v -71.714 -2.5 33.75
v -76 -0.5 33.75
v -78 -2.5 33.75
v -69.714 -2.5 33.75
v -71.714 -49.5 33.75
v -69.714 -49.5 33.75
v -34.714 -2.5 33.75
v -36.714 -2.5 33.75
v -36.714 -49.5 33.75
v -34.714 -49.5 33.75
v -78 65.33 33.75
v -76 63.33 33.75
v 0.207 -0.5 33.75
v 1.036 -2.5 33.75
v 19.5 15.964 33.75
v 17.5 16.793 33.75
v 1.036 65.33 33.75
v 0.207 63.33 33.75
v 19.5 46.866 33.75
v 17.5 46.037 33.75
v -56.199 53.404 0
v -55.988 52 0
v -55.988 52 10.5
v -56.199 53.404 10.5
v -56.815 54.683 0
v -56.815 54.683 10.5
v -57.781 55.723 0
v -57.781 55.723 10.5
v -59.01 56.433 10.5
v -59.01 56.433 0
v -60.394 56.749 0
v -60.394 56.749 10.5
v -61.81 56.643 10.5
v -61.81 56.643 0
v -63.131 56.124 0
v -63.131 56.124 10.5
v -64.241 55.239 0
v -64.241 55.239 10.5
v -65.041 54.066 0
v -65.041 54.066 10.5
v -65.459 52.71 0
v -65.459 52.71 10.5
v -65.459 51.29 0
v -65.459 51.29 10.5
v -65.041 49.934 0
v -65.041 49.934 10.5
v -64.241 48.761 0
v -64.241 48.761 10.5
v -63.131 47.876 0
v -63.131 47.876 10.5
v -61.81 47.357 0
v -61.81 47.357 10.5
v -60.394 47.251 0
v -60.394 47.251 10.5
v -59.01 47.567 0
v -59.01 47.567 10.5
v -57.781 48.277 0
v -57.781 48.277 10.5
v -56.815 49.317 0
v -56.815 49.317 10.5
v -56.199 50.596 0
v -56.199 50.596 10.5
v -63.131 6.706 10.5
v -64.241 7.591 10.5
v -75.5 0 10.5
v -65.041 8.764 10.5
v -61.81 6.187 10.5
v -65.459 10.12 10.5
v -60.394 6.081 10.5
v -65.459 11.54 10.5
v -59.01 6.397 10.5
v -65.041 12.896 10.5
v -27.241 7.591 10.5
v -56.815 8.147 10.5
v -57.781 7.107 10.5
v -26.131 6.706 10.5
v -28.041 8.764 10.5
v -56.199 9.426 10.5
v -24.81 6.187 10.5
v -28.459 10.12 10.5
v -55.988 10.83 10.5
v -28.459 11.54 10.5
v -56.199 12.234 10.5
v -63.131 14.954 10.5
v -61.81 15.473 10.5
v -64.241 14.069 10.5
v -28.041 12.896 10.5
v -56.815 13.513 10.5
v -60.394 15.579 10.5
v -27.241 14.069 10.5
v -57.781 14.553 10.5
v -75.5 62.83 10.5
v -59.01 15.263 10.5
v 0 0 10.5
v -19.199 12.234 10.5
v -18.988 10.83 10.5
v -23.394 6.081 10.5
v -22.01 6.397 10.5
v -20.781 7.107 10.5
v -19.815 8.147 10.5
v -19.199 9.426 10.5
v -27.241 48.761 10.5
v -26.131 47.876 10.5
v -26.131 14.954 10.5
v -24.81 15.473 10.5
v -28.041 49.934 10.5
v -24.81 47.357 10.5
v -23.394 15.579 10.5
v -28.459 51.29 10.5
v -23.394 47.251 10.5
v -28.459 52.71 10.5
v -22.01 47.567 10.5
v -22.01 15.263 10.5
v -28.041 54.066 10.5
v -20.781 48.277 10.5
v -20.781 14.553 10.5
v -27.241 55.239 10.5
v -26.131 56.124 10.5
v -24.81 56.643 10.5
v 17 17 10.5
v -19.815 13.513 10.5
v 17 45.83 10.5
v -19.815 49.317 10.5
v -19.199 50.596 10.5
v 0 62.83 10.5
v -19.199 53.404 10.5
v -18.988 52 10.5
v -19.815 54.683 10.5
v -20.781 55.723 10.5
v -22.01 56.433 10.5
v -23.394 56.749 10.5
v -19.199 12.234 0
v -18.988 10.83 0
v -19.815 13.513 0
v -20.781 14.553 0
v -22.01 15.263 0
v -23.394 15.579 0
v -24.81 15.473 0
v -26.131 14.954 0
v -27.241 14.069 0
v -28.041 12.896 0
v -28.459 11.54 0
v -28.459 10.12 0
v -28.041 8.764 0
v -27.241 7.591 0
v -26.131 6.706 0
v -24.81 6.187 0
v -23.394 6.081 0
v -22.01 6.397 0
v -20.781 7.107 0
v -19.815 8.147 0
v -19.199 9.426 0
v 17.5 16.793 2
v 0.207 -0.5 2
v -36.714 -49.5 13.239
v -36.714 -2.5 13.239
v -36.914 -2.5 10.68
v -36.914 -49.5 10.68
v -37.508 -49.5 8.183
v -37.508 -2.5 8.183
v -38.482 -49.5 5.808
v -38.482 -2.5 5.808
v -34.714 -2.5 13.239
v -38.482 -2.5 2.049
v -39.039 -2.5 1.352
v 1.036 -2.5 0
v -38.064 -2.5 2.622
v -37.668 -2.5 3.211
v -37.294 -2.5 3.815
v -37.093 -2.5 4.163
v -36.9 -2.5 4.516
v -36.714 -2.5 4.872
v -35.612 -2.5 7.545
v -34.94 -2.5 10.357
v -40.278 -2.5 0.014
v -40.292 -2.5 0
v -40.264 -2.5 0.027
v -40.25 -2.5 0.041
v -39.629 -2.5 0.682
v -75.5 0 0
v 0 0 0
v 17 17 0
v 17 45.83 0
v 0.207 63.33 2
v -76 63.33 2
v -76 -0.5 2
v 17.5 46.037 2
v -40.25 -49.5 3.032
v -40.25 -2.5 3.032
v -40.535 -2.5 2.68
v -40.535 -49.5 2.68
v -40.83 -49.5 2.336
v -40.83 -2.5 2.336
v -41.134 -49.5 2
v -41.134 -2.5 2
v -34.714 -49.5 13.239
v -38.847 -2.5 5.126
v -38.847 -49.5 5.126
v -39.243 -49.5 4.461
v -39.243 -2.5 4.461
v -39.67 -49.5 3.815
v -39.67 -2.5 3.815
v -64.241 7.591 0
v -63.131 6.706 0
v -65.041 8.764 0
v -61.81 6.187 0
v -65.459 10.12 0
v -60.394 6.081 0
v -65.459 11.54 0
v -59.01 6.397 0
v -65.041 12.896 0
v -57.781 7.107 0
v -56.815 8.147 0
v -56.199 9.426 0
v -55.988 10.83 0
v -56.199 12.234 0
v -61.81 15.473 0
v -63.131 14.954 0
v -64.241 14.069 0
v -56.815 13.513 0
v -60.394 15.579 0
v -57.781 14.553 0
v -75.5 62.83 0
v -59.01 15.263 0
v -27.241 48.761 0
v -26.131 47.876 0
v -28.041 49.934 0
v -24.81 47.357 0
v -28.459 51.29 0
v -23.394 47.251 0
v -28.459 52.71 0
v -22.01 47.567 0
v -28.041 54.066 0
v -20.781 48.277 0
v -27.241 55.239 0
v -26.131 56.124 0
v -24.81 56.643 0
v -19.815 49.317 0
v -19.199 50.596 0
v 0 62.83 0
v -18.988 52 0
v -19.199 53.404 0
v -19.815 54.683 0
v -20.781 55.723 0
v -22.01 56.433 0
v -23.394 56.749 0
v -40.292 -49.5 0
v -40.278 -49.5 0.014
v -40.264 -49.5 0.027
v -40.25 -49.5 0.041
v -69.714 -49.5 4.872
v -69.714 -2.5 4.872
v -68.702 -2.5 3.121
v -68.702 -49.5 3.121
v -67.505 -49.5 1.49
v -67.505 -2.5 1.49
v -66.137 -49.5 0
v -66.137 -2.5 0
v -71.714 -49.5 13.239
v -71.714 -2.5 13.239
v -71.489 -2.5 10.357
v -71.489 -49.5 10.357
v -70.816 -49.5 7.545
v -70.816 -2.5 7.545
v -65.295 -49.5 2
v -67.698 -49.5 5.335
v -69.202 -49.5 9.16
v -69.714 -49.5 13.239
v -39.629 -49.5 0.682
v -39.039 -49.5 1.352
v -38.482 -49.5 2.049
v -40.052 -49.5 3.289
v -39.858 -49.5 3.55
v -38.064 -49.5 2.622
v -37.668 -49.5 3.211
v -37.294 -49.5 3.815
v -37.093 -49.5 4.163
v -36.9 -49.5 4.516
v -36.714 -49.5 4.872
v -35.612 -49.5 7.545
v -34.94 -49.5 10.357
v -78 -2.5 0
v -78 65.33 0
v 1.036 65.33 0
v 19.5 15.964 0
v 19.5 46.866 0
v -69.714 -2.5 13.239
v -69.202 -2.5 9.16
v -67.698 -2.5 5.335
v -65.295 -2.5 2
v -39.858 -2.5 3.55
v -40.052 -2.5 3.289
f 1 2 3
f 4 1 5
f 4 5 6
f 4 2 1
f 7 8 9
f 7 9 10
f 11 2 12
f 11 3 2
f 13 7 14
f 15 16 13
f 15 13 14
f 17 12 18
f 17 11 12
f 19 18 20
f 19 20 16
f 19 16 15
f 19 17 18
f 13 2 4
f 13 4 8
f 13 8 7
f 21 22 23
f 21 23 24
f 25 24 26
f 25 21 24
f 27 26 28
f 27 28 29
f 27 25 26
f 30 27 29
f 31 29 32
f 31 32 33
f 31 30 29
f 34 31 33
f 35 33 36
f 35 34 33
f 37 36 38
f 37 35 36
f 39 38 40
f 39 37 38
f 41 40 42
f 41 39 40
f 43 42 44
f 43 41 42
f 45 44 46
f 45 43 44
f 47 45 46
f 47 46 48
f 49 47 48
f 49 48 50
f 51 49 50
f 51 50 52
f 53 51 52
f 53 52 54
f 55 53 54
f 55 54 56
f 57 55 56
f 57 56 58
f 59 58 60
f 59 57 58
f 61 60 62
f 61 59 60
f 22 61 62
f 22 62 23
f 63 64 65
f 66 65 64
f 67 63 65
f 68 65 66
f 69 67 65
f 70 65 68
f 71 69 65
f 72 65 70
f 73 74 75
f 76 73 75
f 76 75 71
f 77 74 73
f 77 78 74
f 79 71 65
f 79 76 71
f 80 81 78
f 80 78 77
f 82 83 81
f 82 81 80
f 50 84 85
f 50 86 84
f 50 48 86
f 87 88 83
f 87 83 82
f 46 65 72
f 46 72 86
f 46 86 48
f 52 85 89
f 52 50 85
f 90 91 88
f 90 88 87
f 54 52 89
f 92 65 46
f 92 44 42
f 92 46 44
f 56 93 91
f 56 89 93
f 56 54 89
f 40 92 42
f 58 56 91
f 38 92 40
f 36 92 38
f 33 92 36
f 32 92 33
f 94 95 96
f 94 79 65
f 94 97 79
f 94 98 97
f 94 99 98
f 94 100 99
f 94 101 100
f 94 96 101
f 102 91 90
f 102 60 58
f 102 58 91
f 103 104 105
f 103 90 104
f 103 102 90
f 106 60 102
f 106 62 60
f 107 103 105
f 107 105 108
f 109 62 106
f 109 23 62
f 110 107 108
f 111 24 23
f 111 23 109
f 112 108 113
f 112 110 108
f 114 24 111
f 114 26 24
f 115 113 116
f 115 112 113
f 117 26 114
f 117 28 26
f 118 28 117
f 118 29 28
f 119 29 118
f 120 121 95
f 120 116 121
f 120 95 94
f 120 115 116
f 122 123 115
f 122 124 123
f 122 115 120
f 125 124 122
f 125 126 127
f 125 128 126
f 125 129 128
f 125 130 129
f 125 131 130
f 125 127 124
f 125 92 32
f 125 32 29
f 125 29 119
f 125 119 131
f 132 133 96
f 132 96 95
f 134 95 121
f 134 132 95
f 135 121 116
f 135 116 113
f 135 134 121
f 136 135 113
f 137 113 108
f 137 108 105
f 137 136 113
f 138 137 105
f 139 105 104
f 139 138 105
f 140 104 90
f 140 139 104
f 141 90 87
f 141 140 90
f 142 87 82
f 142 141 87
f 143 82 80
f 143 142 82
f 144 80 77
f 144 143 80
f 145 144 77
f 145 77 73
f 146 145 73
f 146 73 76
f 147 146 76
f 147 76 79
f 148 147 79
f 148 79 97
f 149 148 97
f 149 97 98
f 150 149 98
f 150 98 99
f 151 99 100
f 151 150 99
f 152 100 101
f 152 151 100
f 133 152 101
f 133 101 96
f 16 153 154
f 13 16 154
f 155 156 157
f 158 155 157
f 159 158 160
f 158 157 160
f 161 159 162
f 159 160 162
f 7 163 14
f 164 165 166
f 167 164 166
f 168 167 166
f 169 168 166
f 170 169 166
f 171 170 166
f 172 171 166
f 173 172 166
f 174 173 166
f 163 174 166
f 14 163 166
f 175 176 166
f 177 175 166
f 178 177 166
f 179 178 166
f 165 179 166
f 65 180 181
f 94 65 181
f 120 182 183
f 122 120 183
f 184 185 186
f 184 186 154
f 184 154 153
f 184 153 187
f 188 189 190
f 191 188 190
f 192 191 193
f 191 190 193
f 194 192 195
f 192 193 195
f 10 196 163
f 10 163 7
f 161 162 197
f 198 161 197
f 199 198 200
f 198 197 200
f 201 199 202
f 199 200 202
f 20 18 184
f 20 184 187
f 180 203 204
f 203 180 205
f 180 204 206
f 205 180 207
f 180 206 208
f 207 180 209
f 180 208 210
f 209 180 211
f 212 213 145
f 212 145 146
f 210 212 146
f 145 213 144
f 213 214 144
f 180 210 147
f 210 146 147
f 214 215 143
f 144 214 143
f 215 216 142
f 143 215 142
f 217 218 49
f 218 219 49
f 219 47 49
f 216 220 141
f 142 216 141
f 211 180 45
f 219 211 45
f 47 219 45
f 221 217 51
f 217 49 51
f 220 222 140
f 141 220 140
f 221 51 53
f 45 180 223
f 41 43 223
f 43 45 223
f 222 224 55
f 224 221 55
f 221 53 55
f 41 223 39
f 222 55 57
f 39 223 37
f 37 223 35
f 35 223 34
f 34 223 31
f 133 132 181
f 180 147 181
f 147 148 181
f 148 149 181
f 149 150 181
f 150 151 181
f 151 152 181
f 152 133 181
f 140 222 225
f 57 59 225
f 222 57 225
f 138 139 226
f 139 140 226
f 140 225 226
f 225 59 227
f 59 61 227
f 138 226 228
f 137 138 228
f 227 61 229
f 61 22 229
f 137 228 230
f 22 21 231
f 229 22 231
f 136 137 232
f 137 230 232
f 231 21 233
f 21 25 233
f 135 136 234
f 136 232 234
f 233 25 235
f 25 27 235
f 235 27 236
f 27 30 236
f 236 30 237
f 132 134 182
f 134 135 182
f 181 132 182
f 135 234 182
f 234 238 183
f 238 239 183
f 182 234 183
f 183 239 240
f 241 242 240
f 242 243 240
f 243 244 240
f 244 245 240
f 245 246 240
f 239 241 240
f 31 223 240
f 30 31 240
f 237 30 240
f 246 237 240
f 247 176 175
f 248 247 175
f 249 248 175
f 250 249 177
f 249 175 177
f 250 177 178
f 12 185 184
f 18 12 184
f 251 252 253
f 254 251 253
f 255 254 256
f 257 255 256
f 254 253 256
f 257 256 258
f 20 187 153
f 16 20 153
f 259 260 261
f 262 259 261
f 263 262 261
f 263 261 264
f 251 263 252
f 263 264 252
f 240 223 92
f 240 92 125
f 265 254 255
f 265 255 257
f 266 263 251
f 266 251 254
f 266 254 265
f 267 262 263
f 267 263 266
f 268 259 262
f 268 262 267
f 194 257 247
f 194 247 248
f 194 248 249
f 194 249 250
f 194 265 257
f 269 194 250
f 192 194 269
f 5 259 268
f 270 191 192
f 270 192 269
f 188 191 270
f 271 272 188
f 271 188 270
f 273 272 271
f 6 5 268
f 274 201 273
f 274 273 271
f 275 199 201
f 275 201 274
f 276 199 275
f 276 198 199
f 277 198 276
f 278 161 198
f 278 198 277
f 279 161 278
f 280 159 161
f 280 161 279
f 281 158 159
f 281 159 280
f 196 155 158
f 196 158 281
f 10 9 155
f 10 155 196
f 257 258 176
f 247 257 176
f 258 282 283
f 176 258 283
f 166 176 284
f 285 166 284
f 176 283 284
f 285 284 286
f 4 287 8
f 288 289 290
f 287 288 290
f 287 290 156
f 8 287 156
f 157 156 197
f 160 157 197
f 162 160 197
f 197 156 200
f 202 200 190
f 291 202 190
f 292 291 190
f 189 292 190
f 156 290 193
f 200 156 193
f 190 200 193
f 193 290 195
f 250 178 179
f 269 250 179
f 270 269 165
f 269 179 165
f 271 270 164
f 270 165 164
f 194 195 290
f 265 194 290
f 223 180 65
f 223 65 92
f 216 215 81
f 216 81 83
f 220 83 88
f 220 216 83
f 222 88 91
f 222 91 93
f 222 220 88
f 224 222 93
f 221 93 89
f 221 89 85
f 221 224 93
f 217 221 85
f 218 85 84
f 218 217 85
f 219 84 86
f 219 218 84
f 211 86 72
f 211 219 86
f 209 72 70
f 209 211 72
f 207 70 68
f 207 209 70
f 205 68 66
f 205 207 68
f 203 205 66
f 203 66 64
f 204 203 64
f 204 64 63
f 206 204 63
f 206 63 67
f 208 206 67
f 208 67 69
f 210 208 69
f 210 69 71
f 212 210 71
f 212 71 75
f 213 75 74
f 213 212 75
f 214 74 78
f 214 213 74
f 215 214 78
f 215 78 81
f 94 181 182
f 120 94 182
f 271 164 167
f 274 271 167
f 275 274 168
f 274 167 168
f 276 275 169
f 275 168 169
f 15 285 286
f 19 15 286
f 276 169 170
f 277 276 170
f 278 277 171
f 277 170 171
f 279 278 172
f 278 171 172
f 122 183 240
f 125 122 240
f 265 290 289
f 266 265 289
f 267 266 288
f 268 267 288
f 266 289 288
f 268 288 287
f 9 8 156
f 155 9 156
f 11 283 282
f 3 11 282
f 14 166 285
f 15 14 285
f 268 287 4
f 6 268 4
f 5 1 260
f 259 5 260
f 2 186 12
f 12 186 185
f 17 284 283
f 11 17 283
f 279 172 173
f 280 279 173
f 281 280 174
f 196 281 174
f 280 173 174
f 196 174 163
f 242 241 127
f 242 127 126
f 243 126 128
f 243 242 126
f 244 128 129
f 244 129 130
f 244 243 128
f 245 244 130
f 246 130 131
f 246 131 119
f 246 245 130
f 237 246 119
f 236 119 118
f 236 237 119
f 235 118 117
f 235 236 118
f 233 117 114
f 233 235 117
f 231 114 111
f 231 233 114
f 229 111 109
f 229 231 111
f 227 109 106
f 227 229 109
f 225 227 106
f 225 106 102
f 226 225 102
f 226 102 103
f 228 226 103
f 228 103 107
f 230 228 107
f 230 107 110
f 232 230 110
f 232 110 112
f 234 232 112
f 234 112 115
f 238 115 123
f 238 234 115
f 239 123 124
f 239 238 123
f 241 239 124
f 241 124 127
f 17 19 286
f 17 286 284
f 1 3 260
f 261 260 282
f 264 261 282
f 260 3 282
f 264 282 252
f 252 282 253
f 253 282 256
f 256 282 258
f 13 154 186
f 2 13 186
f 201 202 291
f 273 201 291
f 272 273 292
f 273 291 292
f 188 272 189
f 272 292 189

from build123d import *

# Parameters (mm, degrees)
F0_W     = 75.5
F0_H     = 62.83
F0_R     = 4.7625
F1_DEPTH = 10.5
F2_W     = 76.2071067812
F2_H     = 63.83
F3_DEPTH = 2
F4_DEPTH = 33.75
F9_DEPTH = 47


# Not quite as in the source:
# - a feature of the source that left no trace in its solid (it failed there, or was rolled back) is left out


with BuildPart() as f1:
    # F0 (on Top) → F1 (new body)
    with BuildSketch(Plane.XY):
        with Locations((-37.75, 31.415)):
            Rectangle(F0_W, F0_H)
        with Locations((-60.75, 10.83)):
            Circle(F0_R, mode=Mode.SUBTRACT)
        with Locations((-23.75, 10.83)):
            Circle(F0_R, mode=Mode.SUBTRACT)
        with Locations((-60.75, 52)):
            Circle(F0_R, mode=Mode.SUBTRACT)
        with Locations((-23.75, 52)):
            Circle(F0_R, mode=Mode.SUBTRACT)
        Polygon((0, 62.83), (0, 0), (17, 17), (17, 45.83), align=None)
    extrude(amount=F1_DEPTH)


with BuildPart() as f3:
    # F2 (on Top) → F3 (new body)
    with BuildSketch(Plane.XY):
        Polygon((1.0355339059, 0.3284271247), (0.2071067812, -0.5), (-76, -0.5), (-76, 63.33), (0.2071067812, 63.33), (1.0355339059, 62.5015728753), (1.0355339059, 65.33), (-78, 65.33), (-78, -2.5), (1.0355339059, -2.5), align=None)
        Polygon((17.5, 16.7928932188), (1.0355339059, 0.3284271247), (1.0355339059, -2.5), (19.5, 15.9644660941), (19.5, 46.8655339059), (1.0355339059, 65.33), (1.0355339059, 62.5015728753), (17.5, 46.0371067812), align=None)
        Polygon((1.0355339059, 62.5015728753), (1.0355339059, 0.3284271247), (17.5, 16.7928932188), (17.5, 46.0371067812), align=None)
        with Locations((-37.8964466094, 31.415)):
            Rectangle(F2_W, F2_H)
        Polygon((0.2071067812, 63.33), (0.2071067812, -0.5), (1.0355339059, 0.3284271247), (1.0355339059, 62.5015728753), align=None)
    extrude(amount=F3_DEPTH)

    # F2 (on Top) → F4 (join)
    with BuildSketch(Plane.XY):
        Polygon((1.0355339059, 0.3284271247), (0.2071067812, -0.5), (-76, -0.5), (-76, 63.33), (0.2071067812, 63.33), (1.0355339059, 62.5015728753), (1.0355339059, 65.33), (-78, 65.33), (-78, -2.5), (1.0355339059, -2.5), align=None)
        Polygon((17.5, 16.7928932188), (1.0355339059, 0.3284271247), (1.0355339059, -2.5), (19.5, 15.9644660941), (19.5, 46.8655339059), (1.0355339059, 65.33), (1.0355339059, 62.5015728753), (17.5, 46.0371067812), align=None)
    extrude(amount=F4_DEPTH)

    # F5: union 

    # F6 (on face) → F9 (join)
    with BuildSketch(Plane.XZ.offset(2.5)):
        with BuildLine():
            Line((-34.7144660941, 25.5687510354), (-34.7144660941, 28.1393741738))
            ThreePointArc((-34.7144660941, 28.1393741738), (-35.7447365731, 27.3232988085), (-36.7144660941, 26.4361342702))
            Line((-36.7144660941, 26.4361342702), (-36.7144660941, 23.4451856875))
            ThreePointArc((-36.7144660941, 23.4451856875), (-35.761487475, 24.5512536772), (-34.7144660941, 25.5687510354))
        make_face()
        with BuildLine():
            ThreePointArc((-36.7144660941, 26.4361342702), (-35.7447365731, 27.3232988085), (-34.7144660941, 28.1393741738))
            Line((-34.7144660941, 28.1393741738), (-34.7144660941, 33.75))
            Line((-34.7144660941, 33.75), (-36.7144660941, 33.75))
            Line((-36.7144660941, 33.75), (-36.7144660941, 26.4361342702))
        make_face()
        with BuildLine():
            Line((-34.7144660941, 13.2386868315), (-34.7144660941, 25.5687510354))
            ThreePointArc((-34.7144660941, 25.5687510354), (-35.761487475, 24.5512536772), (-36.7144660941, 23.4451856875))
            Line((-36.7144660941, 23.4451856875), (-36.7144660941, 21.6052870969))
            ThreePointArc((-36.7144660941, 21.6052870969), (-35.2214118786, 17.5398494651), (-34.7144660941, 13.2386868315))
        make_face()
        with BuildLine():
            ThreePointArc((-36.7144660941, 4.8720865662), (-35.2214118786, 8.937524198), (-34.7144660941, 13.2386868315))
            Line((-34.7144660941, 13.2386868315), (-36.7144660941, 13.2386868315))
            Line((-36.7144660941, 13.2386868315), (-36.7144660941, 4.8720865662))
        make_face()
        with BuildLine():
            Line((-36.7144660941, 13.2386868315), (-34.7144660941, 13.2386868315))
            ThreePointArc((-34.7144660941, 13.2386868315), (-35.2214118786, 17.5398494651), (-36.7144660941, 21.6052870969))
            Line((-36.7144660941, 21.6052870969), (-36.7144660941, 13.2386868315))
        make_face()
        with BuildLine():
            Line((-36.7144660941, 4.8720865662), (-36.7144660941, 13.2386868315))
            ThreePointArc((-36.7144660941, 13.2386868315), (-37.1624904325, 9.4197763374), (-38.482233047, 5.8082555219))
            ThreePointArc((-38.482233047, 5.8082555219), (-37.9233701313, 4.7908717814), (-37.2943615313, 3.8152972763))
            ThreePointArc((-37.2943615313, 3.8152972763), (-36.9958041312, 4.3389675026), (-36.7144660941, 4.8720865662))
        make_face()
        with BuildLine():
            ThreePointArc((-37.2943615313, 3.8152972763), (-37.9233701313, 4.7908717814), (-38.482233047, 5.8082555219))
            ThreePointArc((-38.482233047, 5.8082555219), (-39.0410959628, 4.7908717814), (-39.6701045628, 3.8152972763))
            ThreePointArc((-39.6701045628, 3.8152972763), (-39.1015956593, 2.9149999555), (-38.482233047, 2.0489008887))
            ThreePointArc((-38.482233047, 2.0489008887), (-37.8628704348, 2.9149999555), (-37.2943615313, 3.8152972763))
        make_face()
        with BuildLine():
            ThreePointArc((-40.25, 0.0412393929), (-39.3297816541, 1.0130769081), (-38.482233047, 2.0489008887))
            ThreePointArc((-38.482233047, 2.0489008887), (-39.1015956593, 2.9149999555), (-39.6701045628, 3.8152972763))
            ThreePointArc((-39.6701045628, 3.8152972763), (-39.9542699959, 3.4194608214), (-40.25, 3.0321879756))
            Line((-40.25, 3.0321879756), (-40.25, 0.0412393929))
        make_face()
        with BuildLine():
            ThreePointArc((-40.2921144901, 0), (-40.2710408208, 0.0206029237), (-40.25, 0.0412393929))
            Line((-40.25, 0.0412393929), (-40.25, 3.0321879756))
            ThreePointArc((-40.25, 3.0321879756), (-40.6812814796, 2.5069915592), (-41.1338237973, 2))
            ThreePointArc((-41.1338237973, 2), (-41.6789976888, 1.4411036608), (-42.25, 0.9086226277))
            Line((-42.25, 0.9086226277), (-42.25, 0))
            Line((-42.25, 0), (-40.2921144901, 0))
        make_face()
        with BuildLine():
            Line((-41.1338237973, 2), (-42.25, 2))
            Line((-42.25, 2), (-42.25, 0.9086226277))
            ThreePointArc((-42.25, 0.9086226277), (-41.6789976888, 1.4411036608), (-41.1338237973, 2))
        make_face()
        with BuildLine():
            Line((-42.25, 0.9086226277), (-42.25, 2))
            Line((-42.25, 2), (-65.2951083908, 2))
            ThreePointArc((-65.2951083908, 2), (-64.2243980751, 0.9492036132), (-63.0626725793, 0))
            Line((-63.0626725793, 0), (-60.75, 0))
            Line((-60.75, 0), (-43.3662596088, 0))
            ThreePointArc((-43.3662596088, 0), (-42.7982175494, 0.4421339263), (-42.25, 0.9086226277))
        make_face()
        with BuildLine():
            Line((-71.7144660941, 13.2386868315), (-69.7144660941, 13.2386868315))
            Line((-69.7144660941, 13.2386868544), (-69.7144660941, 21.6052870969))
            ThreePointArc((-69.7144660941, 21.6052870969), (-71.2075203095, 17.5398494651), (-71.7144660941, 13.2386868315))
        make_face()
        with BuildLine():
            ThreePointArc((-65.2951083908, 2), (-68.5699308893, 7.2004999412), (-69.7144660941, 13.2386868544))
            Line((-69.7144660941, 13.2386868544), (-69.7144660941, 4.8720865662))
            ThreePointArc((-69.7144660941, 4.8720865662), (-68.1259717308, 2.2889379921), (-66.136817698, 0))
            Line((-66.136817698, 0), (-63.0626725793, 0))
            ThreePointArc((-63.0626725793, 0), (-64.2243980751, 0.9492036132), (-65.2951083908, 2))
        make_face()
        with BuildLine():
            Line((-69.7144660941, 4.8720865662), (-69.7144660941, 13.2386868544))
            Line((-69.7144660941, 13.2386868315), (-71.7144660941, 13.2386868315))
            ThreePointArc((-71.7144660941, 13.2386868315), (-71.2075203095, 8.937524198), (-69.7144660941, 4.8720865662))
        make_face()
        with BuildLine():
            ThreePointArc((-71.7144660941, 13.2386868315), (-71.2075203095, 17.5398494651), (-69.7144660941, 21.6052870969))
            Line((-69.7144660941, 21.6052870969), (-69.7144660941, 33.75))
            Line((-69.7144660941, 33.75), (-71.7144660941, 33.75))
            Line((-71.7144660941, 33.75), (-71.7144660941, 13.2386868315))
        make_face()
        with BuildLine():
            Line((-43.3662596088, 0), (-42.25, 0))
            Line((-42.25, 0), (-42.25, 0.9086226277))
            ThreePointArc((-42.25, 0.9086226277), (-42.7982175494, 0.4421339263), (-43.3662596088, 0))
        make_face()
    extrude(amount=F9_DEPTH)


solid = Compound([f1.part, f3.part])
